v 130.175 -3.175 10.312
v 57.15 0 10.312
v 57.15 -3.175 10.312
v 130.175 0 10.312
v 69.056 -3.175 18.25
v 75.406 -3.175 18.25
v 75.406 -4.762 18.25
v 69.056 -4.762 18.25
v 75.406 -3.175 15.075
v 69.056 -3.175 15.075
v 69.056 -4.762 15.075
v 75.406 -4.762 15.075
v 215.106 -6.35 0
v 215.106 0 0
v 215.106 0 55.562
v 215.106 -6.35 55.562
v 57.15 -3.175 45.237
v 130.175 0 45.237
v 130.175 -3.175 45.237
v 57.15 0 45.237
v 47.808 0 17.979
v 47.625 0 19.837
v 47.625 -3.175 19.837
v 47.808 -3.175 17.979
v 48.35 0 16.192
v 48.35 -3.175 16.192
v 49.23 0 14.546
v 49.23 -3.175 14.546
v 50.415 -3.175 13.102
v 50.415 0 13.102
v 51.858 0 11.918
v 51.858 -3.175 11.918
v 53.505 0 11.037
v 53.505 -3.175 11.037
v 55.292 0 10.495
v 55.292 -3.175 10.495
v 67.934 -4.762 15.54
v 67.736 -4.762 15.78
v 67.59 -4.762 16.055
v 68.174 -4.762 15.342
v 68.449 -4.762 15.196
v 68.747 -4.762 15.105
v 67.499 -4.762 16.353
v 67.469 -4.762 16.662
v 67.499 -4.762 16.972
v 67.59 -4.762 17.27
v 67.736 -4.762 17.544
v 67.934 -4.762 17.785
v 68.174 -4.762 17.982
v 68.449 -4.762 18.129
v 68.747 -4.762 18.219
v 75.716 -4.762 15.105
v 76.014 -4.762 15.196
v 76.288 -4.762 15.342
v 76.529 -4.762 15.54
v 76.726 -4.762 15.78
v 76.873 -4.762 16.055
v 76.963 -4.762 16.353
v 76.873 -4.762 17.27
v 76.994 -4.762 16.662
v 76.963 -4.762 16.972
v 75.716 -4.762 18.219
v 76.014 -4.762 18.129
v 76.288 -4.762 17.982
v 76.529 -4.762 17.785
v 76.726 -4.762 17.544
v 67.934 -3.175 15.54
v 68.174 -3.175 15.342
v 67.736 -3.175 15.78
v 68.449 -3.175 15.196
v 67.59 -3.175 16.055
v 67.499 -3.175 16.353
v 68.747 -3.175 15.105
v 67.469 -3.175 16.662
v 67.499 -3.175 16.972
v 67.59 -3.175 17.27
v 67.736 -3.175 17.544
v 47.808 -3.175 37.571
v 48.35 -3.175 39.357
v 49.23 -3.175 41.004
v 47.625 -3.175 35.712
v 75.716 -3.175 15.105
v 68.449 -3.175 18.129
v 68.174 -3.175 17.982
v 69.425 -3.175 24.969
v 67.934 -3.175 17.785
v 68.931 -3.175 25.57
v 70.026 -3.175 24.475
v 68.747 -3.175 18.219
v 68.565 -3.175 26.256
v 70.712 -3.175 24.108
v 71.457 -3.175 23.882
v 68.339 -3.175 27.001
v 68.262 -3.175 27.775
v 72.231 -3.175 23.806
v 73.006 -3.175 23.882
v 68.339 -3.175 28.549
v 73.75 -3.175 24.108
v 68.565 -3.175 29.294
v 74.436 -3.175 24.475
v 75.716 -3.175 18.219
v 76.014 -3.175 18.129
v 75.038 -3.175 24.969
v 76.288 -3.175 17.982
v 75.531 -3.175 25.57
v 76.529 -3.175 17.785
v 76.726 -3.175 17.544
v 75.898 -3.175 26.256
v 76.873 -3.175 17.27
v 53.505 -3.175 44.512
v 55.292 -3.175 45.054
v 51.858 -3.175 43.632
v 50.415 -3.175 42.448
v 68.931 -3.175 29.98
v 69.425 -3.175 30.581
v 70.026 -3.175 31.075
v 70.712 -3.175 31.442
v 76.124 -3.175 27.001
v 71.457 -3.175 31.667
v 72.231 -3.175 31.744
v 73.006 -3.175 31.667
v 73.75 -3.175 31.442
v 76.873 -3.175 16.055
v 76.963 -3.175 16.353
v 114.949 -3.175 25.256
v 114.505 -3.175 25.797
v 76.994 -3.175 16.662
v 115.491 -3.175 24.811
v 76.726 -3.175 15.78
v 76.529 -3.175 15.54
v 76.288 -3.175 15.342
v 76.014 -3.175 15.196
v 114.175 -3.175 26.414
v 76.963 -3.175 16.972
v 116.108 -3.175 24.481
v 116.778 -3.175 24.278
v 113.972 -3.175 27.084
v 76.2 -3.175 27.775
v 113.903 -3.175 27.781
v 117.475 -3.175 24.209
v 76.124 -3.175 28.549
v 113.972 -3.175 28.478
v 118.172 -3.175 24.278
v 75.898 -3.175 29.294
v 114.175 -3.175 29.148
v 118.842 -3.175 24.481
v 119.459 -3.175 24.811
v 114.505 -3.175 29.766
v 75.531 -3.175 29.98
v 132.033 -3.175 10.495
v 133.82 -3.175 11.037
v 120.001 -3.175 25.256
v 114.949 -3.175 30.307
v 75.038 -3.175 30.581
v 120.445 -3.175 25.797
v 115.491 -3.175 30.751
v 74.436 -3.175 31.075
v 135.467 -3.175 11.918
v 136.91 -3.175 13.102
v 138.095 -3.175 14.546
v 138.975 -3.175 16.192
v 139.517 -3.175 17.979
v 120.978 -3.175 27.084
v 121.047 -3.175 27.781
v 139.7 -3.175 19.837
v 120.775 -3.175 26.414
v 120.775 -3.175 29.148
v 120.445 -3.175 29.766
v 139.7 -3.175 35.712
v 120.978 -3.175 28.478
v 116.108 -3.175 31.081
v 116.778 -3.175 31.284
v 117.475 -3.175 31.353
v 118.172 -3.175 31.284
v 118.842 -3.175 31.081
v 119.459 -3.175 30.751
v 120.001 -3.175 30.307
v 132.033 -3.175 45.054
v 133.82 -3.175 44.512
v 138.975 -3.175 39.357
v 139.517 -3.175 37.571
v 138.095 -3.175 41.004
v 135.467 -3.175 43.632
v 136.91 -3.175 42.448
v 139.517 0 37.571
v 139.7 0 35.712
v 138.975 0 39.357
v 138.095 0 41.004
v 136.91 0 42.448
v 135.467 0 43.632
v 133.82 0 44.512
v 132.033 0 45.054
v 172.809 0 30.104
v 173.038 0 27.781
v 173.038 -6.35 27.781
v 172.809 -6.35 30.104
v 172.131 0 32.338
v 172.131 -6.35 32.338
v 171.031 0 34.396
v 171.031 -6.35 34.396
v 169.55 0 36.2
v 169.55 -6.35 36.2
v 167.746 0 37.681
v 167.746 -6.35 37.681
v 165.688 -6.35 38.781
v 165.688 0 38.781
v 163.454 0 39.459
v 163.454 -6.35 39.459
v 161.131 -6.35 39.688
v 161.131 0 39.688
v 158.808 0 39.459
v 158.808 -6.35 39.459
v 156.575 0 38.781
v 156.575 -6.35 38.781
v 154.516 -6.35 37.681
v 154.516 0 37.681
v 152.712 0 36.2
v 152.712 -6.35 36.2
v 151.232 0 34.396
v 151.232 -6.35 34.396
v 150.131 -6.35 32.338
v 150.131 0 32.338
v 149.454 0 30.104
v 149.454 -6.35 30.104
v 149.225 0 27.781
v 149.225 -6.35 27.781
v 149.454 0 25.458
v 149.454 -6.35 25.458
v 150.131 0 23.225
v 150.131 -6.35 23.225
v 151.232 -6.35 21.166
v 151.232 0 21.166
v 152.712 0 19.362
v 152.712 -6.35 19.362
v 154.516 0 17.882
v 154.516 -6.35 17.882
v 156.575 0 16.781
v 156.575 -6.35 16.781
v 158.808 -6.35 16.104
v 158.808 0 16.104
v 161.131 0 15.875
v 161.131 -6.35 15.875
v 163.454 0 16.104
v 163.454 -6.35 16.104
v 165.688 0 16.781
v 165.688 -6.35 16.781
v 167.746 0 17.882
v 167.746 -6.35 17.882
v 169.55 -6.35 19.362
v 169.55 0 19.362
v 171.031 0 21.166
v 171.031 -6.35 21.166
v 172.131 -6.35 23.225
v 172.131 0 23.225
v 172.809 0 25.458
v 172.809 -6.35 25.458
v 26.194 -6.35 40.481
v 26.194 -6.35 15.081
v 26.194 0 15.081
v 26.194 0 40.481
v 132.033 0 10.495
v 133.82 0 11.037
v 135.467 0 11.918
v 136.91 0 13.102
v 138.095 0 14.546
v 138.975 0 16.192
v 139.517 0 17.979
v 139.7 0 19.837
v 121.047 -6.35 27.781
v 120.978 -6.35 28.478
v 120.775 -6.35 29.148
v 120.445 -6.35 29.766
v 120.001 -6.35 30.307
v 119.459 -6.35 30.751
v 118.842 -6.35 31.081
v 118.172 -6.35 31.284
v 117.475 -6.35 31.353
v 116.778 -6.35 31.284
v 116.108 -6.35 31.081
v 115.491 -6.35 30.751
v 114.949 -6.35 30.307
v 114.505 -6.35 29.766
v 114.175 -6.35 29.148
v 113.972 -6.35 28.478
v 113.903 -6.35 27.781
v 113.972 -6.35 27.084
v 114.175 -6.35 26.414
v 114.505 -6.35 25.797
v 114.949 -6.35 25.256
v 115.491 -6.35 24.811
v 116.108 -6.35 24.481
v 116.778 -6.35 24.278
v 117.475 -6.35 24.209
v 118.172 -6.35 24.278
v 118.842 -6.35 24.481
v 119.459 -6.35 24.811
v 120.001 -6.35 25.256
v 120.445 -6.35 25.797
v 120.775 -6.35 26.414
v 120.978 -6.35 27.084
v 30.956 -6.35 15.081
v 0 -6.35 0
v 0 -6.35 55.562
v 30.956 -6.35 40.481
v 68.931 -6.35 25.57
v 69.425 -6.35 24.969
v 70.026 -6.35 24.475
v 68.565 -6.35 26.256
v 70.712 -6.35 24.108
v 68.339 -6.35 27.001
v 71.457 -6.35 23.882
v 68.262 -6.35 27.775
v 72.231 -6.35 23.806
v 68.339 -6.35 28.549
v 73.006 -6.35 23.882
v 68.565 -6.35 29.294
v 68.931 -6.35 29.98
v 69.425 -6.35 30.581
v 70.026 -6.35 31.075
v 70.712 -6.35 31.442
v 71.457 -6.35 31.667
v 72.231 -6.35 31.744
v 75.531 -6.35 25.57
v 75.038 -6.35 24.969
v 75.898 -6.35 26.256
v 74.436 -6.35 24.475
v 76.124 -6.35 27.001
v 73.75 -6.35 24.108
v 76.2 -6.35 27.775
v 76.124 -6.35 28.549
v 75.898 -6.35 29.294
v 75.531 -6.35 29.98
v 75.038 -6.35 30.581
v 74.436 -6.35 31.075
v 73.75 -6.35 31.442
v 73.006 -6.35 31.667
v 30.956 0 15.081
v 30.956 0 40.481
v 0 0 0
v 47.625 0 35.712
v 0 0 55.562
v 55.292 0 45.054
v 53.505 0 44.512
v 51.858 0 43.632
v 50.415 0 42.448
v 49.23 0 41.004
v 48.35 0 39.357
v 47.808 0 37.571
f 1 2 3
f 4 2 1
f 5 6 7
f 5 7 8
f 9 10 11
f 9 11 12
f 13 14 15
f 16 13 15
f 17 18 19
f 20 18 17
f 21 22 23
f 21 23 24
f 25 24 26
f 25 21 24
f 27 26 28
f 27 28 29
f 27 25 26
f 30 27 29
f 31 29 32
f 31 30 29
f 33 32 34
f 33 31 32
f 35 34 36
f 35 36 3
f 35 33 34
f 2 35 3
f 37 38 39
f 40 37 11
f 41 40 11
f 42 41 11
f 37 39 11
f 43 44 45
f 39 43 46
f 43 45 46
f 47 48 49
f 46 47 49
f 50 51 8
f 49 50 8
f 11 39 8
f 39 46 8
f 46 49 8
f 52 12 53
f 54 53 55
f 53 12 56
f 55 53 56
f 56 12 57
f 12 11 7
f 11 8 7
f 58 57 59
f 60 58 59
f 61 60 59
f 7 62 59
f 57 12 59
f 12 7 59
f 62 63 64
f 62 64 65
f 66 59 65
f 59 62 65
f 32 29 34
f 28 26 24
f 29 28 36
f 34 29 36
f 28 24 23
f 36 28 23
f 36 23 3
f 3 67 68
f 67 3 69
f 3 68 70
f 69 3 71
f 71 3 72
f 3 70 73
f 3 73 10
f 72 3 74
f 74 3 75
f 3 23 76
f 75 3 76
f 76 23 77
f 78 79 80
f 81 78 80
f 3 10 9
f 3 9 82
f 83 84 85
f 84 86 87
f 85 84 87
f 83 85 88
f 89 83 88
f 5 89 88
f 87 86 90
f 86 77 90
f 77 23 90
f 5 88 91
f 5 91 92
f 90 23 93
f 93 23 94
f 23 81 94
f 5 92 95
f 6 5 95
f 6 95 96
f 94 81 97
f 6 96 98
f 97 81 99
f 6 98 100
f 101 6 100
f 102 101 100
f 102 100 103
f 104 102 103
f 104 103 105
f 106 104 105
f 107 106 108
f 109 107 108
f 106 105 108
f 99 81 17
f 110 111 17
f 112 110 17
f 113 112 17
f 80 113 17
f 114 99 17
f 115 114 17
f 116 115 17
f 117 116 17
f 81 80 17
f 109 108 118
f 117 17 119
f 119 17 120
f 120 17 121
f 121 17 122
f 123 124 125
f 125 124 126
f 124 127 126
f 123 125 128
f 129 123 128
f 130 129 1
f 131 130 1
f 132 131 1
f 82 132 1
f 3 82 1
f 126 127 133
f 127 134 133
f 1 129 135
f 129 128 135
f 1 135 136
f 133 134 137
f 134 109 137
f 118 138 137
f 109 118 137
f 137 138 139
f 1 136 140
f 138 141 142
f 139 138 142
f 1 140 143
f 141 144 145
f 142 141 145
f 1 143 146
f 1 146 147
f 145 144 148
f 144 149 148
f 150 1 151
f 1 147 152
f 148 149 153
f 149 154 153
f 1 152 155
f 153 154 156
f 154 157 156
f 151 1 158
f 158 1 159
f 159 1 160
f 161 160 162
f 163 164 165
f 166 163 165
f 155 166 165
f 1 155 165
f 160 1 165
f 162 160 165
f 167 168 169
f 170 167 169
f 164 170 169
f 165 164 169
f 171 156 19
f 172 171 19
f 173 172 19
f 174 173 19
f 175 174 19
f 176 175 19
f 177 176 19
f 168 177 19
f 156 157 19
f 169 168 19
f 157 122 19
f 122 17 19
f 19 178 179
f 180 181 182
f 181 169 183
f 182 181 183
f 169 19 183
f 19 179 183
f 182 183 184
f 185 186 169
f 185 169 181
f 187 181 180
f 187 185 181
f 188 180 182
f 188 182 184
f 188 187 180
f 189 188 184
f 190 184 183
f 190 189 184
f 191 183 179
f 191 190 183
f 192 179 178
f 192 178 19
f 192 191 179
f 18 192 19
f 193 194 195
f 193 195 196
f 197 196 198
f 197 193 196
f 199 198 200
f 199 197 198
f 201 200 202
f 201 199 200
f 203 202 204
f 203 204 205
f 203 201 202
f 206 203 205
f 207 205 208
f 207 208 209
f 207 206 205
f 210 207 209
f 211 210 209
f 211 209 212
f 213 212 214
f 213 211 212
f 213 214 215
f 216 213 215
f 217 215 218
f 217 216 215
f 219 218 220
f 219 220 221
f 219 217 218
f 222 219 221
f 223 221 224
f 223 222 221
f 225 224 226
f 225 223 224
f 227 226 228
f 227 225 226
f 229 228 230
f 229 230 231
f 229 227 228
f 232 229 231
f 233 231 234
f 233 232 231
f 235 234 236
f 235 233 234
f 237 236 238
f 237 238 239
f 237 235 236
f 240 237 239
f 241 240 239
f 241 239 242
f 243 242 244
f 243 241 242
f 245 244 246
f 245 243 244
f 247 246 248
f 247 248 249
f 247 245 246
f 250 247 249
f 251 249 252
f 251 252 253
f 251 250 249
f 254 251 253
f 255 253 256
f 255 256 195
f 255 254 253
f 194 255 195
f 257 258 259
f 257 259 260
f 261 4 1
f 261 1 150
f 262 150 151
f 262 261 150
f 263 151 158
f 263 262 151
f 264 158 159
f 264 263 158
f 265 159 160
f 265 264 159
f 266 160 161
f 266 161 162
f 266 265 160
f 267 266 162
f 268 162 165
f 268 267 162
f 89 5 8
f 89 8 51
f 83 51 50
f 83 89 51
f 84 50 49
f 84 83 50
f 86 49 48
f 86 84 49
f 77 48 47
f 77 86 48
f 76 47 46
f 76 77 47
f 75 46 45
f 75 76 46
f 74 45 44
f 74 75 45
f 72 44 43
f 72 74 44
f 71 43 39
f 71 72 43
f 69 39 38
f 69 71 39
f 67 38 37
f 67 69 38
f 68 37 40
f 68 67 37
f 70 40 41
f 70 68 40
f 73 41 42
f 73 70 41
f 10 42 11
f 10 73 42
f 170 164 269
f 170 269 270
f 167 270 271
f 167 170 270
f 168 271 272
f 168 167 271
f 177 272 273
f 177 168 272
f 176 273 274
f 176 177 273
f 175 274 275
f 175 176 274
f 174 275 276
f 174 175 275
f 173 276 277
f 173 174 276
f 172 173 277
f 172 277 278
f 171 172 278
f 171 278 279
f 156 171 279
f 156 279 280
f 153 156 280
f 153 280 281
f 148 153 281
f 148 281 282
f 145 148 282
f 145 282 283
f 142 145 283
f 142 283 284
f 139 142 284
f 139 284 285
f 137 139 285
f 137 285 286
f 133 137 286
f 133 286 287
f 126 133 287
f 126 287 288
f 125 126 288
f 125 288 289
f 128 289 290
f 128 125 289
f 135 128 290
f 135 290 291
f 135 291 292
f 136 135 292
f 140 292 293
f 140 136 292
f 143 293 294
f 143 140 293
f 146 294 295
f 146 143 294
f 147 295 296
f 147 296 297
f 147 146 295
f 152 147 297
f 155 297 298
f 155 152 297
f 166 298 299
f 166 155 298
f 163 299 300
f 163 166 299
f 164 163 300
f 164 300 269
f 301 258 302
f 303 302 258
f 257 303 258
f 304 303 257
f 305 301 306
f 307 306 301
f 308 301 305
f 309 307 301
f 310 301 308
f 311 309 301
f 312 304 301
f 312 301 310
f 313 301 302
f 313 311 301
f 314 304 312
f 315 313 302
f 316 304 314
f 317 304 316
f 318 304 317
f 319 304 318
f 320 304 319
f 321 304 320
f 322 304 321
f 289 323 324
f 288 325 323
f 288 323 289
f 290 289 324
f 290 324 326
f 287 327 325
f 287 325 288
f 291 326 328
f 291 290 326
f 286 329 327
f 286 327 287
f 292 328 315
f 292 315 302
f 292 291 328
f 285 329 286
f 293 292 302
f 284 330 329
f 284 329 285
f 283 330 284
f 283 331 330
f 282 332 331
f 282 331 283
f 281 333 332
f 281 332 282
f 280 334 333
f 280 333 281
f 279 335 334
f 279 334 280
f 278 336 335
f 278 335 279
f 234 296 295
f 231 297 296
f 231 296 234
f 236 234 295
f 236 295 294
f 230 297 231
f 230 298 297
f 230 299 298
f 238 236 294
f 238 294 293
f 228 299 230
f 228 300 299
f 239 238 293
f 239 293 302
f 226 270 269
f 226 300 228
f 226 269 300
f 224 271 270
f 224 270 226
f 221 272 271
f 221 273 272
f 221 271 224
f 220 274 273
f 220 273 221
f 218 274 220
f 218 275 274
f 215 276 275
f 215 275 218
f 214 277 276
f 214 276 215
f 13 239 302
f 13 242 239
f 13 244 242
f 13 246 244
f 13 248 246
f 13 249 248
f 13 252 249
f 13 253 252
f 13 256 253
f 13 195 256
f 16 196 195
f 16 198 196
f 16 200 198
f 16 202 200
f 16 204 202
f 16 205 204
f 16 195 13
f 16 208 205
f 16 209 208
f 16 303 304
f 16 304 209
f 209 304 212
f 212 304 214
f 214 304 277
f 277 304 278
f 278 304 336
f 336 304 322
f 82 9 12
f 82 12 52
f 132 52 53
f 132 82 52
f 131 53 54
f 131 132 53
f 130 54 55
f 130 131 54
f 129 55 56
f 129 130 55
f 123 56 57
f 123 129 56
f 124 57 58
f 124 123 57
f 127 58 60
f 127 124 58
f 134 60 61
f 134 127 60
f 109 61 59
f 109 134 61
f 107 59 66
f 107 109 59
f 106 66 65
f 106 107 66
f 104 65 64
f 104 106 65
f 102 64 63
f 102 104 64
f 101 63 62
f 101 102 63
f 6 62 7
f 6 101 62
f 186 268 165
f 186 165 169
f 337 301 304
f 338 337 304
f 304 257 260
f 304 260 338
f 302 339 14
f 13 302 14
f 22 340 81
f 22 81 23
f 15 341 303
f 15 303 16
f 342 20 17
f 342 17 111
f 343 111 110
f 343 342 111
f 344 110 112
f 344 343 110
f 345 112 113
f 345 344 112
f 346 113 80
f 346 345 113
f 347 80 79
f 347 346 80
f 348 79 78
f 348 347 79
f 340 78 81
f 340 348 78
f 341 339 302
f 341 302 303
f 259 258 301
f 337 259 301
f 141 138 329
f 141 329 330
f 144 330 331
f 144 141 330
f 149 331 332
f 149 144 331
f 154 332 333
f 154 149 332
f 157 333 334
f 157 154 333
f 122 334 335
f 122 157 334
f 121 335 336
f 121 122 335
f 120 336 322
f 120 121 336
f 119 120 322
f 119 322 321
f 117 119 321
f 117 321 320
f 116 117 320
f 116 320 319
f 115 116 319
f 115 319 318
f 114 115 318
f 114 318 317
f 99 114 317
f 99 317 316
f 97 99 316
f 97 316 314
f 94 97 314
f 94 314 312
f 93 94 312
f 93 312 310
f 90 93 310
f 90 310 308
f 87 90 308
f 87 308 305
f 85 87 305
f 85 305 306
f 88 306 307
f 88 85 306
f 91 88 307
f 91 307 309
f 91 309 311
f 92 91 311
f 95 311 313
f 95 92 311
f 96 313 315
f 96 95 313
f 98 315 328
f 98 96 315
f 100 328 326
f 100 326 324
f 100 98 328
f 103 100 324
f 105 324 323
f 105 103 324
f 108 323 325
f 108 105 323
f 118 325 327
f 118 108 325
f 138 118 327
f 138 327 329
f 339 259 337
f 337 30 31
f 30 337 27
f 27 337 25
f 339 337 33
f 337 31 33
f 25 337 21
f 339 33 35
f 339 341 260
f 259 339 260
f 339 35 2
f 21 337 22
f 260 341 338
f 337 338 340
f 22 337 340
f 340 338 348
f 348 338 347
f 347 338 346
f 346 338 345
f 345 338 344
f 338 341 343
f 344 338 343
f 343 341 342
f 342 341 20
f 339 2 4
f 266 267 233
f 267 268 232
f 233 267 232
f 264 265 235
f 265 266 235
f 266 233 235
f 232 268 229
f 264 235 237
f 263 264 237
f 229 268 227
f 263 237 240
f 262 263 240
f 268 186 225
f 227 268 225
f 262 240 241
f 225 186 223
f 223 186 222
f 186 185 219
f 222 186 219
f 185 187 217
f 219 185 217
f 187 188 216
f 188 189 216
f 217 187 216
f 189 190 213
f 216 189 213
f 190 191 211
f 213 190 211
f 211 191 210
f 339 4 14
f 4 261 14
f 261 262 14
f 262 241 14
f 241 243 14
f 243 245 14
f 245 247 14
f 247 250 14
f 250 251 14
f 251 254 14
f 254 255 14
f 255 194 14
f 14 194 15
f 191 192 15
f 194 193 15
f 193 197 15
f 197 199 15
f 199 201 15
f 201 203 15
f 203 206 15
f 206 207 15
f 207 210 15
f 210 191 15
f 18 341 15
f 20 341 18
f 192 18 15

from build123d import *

# Parameters (mm, degrees)
F0_W          = 215.10625
F0_H          = 55.5625
F0_R          = 3.96875
F0_R_2        = 3.571875
F0_R_3        = 11.90625
F1_DEPTH      = 6.35
F2_W          = 4.7625
F2_H          = 25.4
F3_DEPTH      = 332
F3_DEPTH_BACK = 6.351
F5_DEPTH      = 3.175
F7_DEPTH      = 4.7625
F7_DEPTH_BACK = 3.175


# Not quite as in the source:
# - an extrude ends at something that could not be found from the text; its depth is read off the source's solid


with BuildPart() as f1:
    # F0 (on Front) → F1 (new body)
    with BuildSketch(Plane.XZ):
        with Locations((107.553125, 27.78125)):
            Rectangle(F0_W, F0_H)
        with Locations((72.23125, 27.7749)):
            Circle(F0_R, mode=Mode.SUBTRACT)
        with Locations((117.475, 27.78125)):
            Circle(F0_R_2, mode=Mode.SUBTRACT)
        with Locations((161.13125, 27.78125)):
            Circle(F0_R_3, mode=Mode.SUBTRACT)
    extrude(amount=F1_DEPTH)

    # F2 (on face) → F3 (cut, two sides)
    with BuildSketch(Plane.XZ.offset(6.35)) as f3_sk:
        with Locations((28.575, 27.78125)):
            Rectangle(F2_W, F2_H)
    extrude(amount=F3_DEPTH, mode=Mode.SUBTRACT)
    extrude(f3_sk.sketch, amount=-F3_DEPTH_BACK, mode=Mode.SUBTRACT)

    # F4 (on face) → F5 (cut)
    with BuildSketch(Plane.XZ):
        with BuildLine():
            Line((57.15, 10.3124), (130.175, 10.3124))
            ThreePointArc((130.175, 10.3124), (136.9101920908, 13.1022079092), (139.7, 19.8374))
            Line((139.7, 19.8374), (139.7, 35.7124))
            ThreePointArc((139.7, 35.7124), (136.9101920908, 42.4475920908), (130.175, 45.2374))
            Line((130.175, 45.2374), (57.15, 45.2374))
            ThreePointArc((57.15, 45.2374), (50.4148079092, 42.4475920908), (47.625, 35.7124))
            Line((47.625, 35.7124), (47.625, 19.8374))
            ThreePointArc((47.625, 19.8374), (50.4148079092, 13.1022079092), (57.15, 10.3124))
        make_face()
    extrude(amount=F5_DEPTH, mode=Mode.SUBTRACT)

    # F6 (on face) → F7 (cut, two sides)
    with BuildSketch(Plane.XZ) as f7_sk:
        with BuildLine():
            Line((69.05625, 15.0749), (75.40625, 15.0749))
            ThreePointArc((75.40625, 15.0749), (76.99375, 16.6624), (75.40625, 18.2499))
            Line((75.40625, 18.2499), (69.05625, 18.2499))
            ThreePointArc((69.05625, 18.2499), (67.46875, 16.6624), (69.05625, 15.0749))
        make_face()
    extrude(amount=F7_DEPTH, mode=Mode.SUBTRACT)
    extrude(f7_sk.sketch, amount=-F7_DEPTH_BACK, mode=Mode.SUBTRACT)


solid = f1.part
